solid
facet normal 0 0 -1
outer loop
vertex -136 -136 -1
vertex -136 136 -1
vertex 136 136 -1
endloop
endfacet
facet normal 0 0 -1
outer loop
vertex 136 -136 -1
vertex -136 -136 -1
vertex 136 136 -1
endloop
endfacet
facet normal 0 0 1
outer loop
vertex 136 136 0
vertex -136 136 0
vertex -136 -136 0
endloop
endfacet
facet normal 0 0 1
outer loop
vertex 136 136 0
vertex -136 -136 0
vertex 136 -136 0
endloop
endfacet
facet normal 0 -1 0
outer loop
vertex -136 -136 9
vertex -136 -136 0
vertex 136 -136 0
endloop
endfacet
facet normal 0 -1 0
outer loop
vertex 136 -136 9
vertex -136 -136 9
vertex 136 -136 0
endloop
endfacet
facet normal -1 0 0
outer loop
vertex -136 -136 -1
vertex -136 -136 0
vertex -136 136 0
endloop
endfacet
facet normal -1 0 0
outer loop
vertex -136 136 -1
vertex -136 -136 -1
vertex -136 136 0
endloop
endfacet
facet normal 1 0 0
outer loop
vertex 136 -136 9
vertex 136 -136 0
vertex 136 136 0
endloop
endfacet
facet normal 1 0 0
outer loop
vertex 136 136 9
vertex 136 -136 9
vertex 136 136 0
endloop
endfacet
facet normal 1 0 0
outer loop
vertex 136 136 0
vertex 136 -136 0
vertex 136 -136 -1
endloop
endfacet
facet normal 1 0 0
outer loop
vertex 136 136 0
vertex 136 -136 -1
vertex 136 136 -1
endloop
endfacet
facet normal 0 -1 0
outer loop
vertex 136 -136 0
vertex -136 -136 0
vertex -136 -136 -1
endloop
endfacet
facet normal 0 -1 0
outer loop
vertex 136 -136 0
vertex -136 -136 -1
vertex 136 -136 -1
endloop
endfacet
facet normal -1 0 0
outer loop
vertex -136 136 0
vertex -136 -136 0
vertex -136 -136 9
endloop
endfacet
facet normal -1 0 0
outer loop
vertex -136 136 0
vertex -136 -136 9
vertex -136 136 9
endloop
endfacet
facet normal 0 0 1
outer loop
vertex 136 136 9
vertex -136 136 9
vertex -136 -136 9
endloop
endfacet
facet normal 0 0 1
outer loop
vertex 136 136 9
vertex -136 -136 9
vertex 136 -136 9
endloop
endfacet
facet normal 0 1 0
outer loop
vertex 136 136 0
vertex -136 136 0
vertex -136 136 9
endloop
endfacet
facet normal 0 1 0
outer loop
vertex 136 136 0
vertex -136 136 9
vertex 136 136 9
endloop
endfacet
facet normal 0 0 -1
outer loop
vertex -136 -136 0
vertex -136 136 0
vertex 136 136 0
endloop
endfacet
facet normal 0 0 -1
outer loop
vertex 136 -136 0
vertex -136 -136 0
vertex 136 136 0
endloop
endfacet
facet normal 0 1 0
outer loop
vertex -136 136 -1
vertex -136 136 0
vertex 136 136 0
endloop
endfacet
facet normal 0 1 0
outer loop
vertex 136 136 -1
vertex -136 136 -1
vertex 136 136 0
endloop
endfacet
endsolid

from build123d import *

# Parameters (mm, degrees)
F0_W     = 272
F0_H     = 272
F1_DEPTH = 10
F2_DEPTH = 1
F3_DEPTH = 1


with BuildPart() as f1:
    # F0 (on Top) → F1 (new body)
    with BuildSketch(Plane.XY):
        Rectangle(F0_W, F0_H)
    extrude(amount=F1_DEPTH)


with BuildPart() as f2:
    # F2 (new): a face of the model
    f2_faces = [f1.part.faces().sort_by_distance(p)[0] for p in [
        (0, 0, 0),
    ]]
    extrude(f2_faces, amount=F2_DEPTH)


with BuildPart() as f1_1:
    add(f1.part)

    # F3 (cut): a face of the model
    f3_faces = [f1_1.faces().sort_by_distance(p)[0] for p in [
        (0, 0, 10),
    ]]
    extrude(f3_faces, amount=-F3_DEPTH, mode=Mode.SUBTRACT)


solid = Compound([f2.part, f1_1.part])
